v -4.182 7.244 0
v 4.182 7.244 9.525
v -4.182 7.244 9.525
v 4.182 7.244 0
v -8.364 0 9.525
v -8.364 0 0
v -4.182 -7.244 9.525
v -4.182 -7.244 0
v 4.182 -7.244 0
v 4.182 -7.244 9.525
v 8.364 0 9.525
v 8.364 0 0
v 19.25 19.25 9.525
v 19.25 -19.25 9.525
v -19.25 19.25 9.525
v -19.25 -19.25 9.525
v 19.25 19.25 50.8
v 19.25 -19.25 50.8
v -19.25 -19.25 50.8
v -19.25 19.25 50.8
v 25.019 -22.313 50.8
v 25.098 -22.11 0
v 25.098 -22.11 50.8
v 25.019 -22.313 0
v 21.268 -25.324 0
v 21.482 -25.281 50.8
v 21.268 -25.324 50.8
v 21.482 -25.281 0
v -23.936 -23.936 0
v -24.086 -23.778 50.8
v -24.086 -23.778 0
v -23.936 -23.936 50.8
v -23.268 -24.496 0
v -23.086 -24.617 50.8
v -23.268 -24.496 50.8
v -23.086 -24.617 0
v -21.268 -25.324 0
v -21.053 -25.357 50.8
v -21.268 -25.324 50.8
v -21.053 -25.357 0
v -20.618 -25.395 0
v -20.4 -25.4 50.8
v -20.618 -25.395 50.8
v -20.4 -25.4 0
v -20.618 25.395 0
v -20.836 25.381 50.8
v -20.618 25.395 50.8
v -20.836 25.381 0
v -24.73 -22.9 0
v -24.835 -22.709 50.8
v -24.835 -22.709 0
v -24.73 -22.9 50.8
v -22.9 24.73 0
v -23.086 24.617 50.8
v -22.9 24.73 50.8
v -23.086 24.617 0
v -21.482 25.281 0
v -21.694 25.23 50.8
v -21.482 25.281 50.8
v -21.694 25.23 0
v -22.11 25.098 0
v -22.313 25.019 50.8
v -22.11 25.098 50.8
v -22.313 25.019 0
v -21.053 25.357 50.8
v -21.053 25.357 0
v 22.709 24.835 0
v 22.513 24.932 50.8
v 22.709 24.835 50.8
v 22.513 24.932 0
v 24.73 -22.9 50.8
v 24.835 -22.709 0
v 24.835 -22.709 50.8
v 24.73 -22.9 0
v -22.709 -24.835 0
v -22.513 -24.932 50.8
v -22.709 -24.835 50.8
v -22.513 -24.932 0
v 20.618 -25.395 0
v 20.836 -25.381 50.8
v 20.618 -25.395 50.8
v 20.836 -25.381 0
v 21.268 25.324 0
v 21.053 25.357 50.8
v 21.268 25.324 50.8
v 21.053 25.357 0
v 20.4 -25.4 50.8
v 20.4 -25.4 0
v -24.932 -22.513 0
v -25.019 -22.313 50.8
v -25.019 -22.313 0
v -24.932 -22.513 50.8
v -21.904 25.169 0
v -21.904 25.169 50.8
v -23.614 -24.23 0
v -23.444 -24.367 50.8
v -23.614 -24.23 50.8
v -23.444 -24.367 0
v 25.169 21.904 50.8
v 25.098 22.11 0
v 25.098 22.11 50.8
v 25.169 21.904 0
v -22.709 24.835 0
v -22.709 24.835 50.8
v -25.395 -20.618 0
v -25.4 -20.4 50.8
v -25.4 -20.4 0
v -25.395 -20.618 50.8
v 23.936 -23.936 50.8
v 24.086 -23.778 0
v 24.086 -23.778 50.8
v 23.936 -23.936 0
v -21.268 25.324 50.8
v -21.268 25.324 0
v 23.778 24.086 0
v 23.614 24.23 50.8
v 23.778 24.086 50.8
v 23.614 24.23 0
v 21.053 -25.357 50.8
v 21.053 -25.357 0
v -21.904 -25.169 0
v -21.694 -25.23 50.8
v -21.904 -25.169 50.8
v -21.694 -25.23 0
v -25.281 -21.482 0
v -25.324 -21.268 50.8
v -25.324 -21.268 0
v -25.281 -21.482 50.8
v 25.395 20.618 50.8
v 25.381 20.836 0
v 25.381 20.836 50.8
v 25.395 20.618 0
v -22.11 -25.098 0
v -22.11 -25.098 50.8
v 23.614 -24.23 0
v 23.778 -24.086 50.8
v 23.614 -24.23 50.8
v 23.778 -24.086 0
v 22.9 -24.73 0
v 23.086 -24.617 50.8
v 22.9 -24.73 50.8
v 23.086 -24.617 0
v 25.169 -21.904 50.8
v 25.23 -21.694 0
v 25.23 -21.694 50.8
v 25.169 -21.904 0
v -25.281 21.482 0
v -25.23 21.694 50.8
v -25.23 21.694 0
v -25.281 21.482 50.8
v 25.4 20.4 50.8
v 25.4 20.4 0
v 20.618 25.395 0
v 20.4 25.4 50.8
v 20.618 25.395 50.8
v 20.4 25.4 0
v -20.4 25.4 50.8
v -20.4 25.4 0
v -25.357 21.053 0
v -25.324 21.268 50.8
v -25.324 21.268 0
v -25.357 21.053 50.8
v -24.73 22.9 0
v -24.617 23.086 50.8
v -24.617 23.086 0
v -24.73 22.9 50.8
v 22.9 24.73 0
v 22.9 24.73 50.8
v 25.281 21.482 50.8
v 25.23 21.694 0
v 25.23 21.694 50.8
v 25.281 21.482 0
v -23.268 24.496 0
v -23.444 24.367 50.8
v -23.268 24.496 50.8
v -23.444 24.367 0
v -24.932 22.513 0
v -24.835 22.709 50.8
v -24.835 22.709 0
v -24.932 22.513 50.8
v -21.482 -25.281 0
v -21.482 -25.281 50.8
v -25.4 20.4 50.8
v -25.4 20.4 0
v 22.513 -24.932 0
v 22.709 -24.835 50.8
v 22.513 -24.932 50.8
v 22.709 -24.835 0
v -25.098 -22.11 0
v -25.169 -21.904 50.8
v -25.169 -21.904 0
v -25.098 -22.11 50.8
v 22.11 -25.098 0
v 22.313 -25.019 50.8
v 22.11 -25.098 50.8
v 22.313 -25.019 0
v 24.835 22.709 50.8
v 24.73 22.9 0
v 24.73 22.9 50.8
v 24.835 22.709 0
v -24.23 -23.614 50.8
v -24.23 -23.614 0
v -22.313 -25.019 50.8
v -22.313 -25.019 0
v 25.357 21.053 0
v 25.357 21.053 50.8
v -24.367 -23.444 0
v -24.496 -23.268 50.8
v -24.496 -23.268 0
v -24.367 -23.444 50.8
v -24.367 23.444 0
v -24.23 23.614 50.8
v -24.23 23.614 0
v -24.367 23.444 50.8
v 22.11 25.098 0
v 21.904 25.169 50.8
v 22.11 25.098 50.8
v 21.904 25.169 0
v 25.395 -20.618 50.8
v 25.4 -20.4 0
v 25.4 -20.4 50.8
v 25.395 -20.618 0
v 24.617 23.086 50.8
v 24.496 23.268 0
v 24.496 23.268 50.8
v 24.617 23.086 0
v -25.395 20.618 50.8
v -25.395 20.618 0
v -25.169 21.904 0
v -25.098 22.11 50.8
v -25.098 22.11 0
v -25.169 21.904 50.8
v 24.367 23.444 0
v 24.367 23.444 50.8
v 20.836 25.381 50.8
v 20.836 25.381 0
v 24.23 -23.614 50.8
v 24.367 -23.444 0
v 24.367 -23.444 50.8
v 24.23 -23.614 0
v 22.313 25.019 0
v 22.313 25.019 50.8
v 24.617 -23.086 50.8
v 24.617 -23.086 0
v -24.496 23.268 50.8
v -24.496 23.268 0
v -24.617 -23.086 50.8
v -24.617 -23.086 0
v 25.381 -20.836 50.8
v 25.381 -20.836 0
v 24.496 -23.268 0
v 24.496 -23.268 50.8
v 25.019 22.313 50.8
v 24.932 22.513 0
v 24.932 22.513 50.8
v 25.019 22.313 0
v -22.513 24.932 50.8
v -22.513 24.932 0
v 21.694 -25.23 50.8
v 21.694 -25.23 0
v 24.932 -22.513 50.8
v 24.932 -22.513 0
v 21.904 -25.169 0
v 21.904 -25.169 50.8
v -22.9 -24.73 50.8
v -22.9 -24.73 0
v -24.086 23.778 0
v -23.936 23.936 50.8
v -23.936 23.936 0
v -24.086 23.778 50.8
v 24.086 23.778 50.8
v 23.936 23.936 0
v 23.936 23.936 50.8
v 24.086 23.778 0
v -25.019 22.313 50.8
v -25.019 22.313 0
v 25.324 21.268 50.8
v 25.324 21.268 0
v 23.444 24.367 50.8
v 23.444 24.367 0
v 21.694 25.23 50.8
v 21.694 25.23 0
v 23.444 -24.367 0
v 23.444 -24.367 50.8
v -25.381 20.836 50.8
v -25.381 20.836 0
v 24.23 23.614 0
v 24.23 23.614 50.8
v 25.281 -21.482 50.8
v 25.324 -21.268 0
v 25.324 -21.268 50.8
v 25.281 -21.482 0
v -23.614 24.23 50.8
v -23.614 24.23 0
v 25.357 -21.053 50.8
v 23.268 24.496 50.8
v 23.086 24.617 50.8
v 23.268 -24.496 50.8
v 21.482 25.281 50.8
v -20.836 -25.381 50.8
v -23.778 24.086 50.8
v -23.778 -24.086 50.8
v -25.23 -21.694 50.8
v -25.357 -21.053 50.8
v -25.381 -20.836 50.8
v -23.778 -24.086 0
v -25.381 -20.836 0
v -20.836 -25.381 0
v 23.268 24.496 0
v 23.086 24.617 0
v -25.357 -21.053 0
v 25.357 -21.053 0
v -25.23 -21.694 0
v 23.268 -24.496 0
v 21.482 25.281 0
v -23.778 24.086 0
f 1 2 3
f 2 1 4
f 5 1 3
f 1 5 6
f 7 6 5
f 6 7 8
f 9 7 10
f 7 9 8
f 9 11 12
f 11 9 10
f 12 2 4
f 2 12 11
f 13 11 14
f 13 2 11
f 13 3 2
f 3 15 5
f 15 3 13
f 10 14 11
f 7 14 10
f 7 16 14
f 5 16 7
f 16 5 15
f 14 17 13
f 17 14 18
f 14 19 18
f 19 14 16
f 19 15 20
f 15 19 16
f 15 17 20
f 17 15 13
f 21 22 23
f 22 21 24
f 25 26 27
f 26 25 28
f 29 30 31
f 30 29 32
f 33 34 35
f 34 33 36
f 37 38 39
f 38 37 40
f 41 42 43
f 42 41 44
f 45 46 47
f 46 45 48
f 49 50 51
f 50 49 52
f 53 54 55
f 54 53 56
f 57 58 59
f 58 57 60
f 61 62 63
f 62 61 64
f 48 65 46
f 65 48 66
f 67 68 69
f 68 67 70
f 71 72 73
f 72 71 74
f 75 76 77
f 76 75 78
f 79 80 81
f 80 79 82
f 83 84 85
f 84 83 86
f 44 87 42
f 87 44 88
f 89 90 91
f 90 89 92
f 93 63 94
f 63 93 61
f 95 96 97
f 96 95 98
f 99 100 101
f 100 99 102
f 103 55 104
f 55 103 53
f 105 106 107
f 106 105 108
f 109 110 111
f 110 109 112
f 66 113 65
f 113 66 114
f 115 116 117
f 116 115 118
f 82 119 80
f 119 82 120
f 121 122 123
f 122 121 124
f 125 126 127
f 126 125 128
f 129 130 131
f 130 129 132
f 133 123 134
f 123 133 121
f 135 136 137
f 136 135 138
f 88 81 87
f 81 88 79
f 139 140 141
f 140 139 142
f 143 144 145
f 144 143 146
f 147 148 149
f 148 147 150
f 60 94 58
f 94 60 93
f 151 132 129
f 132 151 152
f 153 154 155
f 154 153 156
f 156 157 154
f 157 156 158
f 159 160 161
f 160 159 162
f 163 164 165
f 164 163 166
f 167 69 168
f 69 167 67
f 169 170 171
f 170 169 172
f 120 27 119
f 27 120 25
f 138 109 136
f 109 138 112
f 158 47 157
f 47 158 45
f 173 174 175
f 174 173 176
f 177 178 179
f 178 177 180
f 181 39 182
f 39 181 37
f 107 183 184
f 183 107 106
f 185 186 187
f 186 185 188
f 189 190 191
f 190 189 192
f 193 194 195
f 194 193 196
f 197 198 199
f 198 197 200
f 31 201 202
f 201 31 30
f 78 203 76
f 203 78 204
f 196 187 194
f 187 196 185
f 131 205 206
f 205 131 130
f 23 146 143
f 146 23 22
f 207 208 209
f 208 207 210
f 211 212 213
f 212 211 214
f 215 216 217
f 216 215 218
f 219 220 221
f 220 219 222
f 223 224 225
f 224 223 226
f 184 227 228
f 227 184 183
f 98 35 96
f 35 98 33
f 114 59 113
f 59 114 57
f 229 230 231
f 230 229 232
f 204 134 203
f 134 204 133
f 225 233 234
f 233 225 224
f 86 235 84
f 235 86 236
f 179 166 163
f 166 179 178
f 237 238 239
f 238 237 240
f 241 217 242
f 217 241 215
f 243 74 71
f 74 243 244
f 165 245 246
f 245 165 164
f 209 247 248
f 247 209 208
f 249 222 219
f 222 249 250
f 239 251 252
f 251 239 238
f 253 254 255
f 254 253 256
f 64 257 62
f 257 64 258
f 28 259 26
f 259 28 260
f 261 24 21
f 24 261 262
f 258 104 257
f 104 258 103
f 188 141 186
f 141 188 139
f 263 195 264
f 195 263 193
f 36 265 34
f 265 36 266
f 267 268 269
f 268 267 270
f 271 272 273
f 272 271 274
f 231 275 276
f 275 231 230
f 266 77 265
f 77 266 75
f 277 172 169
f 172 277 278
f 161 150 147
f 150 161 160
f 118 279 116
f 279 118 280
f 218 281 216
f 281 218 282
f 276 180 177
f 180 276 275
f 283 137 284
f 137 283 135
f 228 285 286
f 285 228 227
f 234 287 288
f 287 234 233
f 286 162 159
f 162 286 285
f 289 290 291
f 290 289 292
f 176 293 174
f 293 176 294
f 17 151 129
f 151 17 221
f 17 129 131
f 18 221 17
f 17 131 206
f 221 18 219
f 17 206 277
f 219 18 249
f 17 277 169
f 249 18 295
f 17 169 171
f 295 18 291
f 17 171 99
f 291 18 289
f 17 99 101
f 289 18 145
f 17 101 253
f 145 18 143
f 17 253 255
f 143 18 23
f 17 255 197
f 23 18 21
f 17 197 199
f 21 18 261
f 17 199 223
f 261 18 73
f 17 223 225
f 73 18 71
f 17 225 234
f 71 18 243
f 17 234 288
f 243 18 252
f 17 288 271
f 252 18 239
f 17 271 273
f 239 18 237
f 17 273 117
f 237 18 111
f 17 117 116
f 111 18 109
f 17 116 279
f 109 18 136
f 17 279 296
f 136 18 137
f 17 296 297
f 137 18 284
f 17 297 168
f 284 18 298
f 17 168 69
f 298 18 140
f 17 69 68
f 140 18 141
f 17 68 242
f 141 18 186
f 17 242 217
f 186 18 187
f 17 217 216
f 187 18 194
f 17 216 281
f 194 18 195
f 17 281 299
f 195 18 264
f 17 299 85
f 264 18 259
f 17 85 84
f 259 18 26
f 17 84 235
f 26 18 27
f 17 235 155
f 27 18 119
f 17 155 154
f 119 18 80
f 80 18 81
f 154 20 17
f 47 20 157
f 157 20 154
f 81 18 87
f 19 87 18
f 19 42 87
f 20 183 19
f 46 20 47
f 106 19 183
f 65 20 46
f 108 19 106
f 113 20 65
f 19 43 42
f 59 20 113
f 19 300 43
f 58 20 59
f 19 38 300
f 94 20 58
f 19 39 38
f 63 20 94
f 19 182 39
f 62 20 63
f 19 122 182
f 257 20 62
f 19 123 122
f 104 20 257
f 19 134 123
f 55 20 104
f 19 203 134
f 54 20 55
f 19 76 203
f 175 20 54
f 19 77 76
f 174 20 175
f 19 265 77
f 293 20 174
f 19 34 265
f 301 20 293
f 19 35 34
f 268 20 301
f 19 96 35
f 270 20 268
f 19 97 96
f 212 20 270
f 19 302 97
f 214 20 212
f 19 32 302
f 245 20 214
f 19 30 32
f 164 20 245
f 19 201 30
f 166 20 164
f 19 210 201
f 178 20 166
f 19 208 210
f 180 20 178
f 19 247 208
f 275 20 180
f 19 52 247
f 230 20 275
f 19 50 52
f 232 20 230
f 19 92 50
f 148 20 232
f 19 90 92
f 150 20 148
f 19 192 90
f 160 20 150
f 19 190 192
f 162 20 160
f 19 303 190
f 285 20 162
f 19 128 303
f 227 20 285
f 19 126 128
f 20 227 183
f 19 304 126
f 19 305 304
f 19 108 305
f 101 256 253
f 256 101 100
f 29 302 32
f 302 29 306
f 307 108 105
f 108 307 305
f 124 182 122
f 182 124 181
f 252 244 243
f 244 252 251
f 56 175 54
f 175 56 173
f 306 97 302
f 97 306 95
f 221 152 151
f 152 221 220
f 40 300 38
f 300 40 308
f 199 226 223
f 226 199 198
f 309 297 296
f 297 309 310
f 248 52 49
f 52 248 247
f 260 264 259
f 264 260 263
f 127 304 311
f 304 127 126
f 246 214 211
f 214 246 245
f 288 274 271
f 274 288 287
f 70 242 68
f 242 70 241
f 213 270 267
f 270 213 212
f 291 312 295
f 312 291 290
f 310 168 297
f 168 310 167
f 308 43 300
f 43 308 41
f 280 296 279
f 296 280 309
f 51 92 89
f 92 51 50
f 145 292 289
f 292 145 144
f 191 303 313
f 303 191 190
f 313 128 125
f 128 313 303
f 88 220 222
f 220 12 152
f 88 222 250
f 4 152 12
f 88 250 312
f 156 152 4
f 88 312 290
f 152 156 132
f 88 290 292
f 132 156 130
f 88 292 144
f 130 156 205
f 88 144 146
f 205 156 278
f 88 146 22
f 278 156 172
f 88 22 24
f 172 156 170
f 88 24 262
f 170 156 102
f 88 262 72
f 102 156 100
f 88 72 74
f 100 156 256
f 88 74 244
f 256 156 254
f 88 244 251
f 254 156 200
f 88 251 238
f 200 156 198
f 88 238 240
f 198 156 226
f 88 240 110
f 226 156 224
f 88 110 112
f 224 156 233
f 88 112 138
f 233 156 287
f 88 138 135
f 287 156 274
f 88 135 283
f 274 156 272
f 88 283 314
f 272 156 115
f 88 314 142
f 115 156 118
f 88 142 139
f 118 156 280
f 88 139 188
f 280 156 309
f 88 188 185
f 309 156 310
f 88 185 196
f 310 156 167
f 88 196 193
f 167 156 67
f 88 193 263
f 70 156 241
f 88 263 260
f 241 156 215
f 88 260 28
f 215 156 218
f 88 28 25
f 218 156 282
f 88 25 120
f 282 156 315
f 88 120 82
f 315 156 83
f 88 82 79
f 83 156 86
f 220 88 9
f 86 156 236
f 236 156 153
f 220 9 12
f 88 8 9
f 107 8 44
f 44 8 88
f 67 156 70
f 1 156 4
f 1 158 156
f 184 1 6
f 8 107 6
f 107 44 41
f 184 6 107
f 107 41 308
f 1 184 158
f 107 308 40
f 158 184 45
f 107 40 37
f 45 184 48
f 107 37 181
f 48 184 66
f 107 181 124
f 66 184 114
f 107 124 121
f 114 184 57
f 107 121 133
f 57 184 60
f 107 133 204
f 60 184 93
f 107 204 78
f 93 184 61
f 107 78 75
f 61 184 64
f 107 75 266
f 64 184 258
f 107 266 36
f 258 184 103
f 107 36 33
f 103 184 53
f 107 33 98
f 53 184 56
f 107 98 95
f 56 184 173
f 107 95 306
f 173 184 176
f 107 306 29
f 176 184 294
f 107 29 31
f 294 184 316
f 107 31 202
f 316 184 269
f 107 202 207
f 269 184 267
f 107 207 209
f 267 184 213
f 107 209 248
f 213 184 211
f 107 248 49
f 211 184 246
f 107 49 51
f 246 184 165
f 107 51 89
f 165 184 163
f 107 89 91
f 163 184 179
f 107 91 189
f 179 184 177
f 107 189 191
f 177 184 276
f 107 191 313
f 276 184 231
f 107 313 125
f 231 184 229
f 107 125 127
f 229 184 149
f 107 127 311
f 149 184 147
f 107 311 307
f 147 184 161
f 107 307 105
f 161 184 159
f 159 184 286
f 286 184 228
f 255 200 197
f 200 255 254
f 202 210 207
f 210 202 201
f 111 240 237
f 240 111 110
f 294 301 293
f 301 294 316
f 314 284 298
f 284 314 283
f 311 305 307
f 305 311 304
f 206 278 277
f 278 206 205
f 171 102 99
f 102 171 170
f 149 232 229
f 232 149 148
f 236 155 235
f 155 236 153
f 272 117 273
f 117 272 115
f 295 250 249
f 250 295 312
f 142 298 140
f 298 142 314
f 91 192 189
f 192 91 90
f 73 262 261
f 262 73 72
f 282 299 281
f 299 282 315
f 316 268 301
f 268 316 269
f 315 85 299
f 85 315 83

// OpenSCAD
// file: ../lib/TOGUnitTable-v1.scad
// TOGUnitTable-v1.1.0 - Library for handling 'complex amounts' in the form of [multiplier, unit name], e.g. [1.5, "inch"]
//
// 2023-07-01: the following 'annotation' is something I just made up,
// but is intended as a way for future packaging tools to know that it's 'safe'
// (because everything has been somewhat namespaced) to turn a `use <x>`
// into an `include <x>`, making it inlinable:
// safe-to-include: true
// 
// Versions:
// v1.0.0:
// - Created it.
// v1.1.0:
// - Add optional 'dbgctxstr' parameter to unit decoding functions, for better error messages
// 
// Naming convention:
// Doing 'OO without classes', here.
// Fully qualified name = class or package name + "__" + member name
// Class or package name may itself be namespaced, and class names may double as package names.
// Here, tog_unittable names both a class and a package.

// Demo unit table uses 'micrometer' as the base unit
// in order to keep multipliers as integers as much as possible.
tog_unittable__demo_unit_table = [
	["um",    [    1   ,   "um"], "micrometer" ],
	["mm",    [ 1000   ,   "um"], "millimeter" ],
	["inch",  [25400   ,   "um"], "inch"       ],
	["u",     [    1/16, "inch"], "model unit" ], // As used by TGx9 et al
	["atom",  [    8   ,    "u"], "model atom" ],
	["chunk", [    3   , "atom"], "model chunk"],
];

use <./DbgCtxStrLib1.scad>

function tog_unittable__list__filter(list, predicate) = [
	for( item=list ) if( predicate(item) ) item
];
function tog_unittable__list__first(list, on_error) =
	len(list) > 0 ? list[0] : on_error();

function tog_unittable__unit_value_ca(unit_table, unit_name, dbgctxstr=undef) =
	tog_unittable__list__first(
		tog_unittable__list__filter(unit_table, function (entry) entry[0] == unit_name),
		function () assert(false,
			str("Did not find entry for unit '", unit_name, "' in unit table", dbgctxstr_errmsg_suffix(dbgctxstr))
		)
	)[1];

function tog_unittable__ca__is_valid( ca ) =
	is_list(ca) && len(ca) == 2;

// Break down 'amount' until it is in a base unit (one which is defined in terms of itself)
function tog_unittable__simplify_ca(unit_table, amount, dbgctxstr=undef) =
	assert( tog_unittable__ca__is_valid(amount), str(amount, " is not a valid Complex Amount (should be [numeric_value, \"unit_name\"])", dbgctxstr=dbgctxstr) )
	let( unit_value_ca = tog_unittable__unit_value_ca(unit_table, amount[1], dbgctxstr=dbgctxstr) )
	unit_value_ca[1] == amount[1] ? amount :
		tog_unittable__simplify_ca(unit_table, [amount[0] * unit_value_ca[0], unit_value_ca[1]]);

function tog_unittable__divide_ca(unit_table, numerator, denominator, dbgctxstr=undef) =
	let(
		numerator_base_ca   = tog_unittable__simplify_ca(unit_table, numerator, dbgctxstr=dbgctxstr),
		denominator_base_ca = tog_unittable__simplify_ca(unit_table, denominator, dbgctxstr=dbgctxstr)
	)
	assert(numerator_base_ca[1] == denominator_base_ca[1], str("Different base units found for ", numerator[1], " and ", denominator[1]))
	numerator_base_ca[0] / denominator_base_ca[0];	

assert(tog_unittable__divide_ca(tog_unittable__demo_unit_table, [1,   "mm"], [  1, "mm"]) ==     1   );
assert(tog_unittable__divide_ca(tog_unittable__demo_unit_table, [1,   "mm"], [  1, "um"]) ==  1000   );
assert(tog_unittable__divide_ca(tog_unittable__demo_unit_table, [1, "inch"], [  1, "um"]) == 25400   );
assert(tog_unittable__divide_ca(tog_unittable__demo_unit_table, [1, "inch"], [  1, "mm"]) ==    25.4 );
assert(tog_unittable__divide_ca(tog_unittable__demo_unit_table, [1, "inch"], [254, "um"]) ==   100   );
assert(tog_unittable__divide_ca(tog_unittable__demo_unit_table, [1,    "u"], [  1, "um"]) ==  1587.5 );
// file: ../lib/TOGStringLib1.scad
// TOGStringLib1.7
// 
// Functions for parsing quantities
// and other misc. string handling.
// 
// v1.5
// - togstr1_parse_quantity will treat unit-only strings as meaning 1/1 of that unit.
//   e.g. togstr1_parse_quantity("foot") = [[[1,1], "foot", 4]]
// v1.6:
// - togstr1_parse_quantity allows unit name to be omitted when quantity is zero and $togunits1_default_unit is defined
// v1.7:
// - Add optional 'dbgctxstr' parameter to unit decoding functions, for better error messages
// 
// Globals: $togunits1_default_unit - affects what 'unit' is returned
// when interpreting numbers or strings that lack the unit.


function togstr1__todo(message) = assert(false, str("TODO: ", message));

module togstr1__assert_eq(a, b) {
	if( a != b ) {
		assert( a == b, str(a, " != ", b) );
	}
}



function togstr1_slice(source, i0, i1) =
	i0 == i1 ? "" :
	str(source[i0], togstr1_slice(source, i0+1, i1));

function togstr1_tokenize(source, sep, maxcount=9999, i=0, tokenstart=0) =
	len(source) == i ? (
		(tokenstart < i) ? [togstr1_slice(source, tokenstart, i)] : []
	) :
	source[i] == sep ? (
		(tokenstart < i) ? concat([togstr1_slice(source, tokenstart, i)], togstr1_tokenize(source, sep, maxcount-1, i+1, i+1)) :
		togstr1_tokenize(source, sep, maxcount, i+1, i+1)
	) :
	maxcount <= 1 ? [togstr1_slice(source, tokenstart, len(source))] :
	togstr1_tokenize(source, sep, maxcount, i+1, tokenstart);

togstr1__assert_eq( ["foo","bar","baz"], togstr1_tokenize("foo-bar-baz", "-") );
// Duplicate delimiters are ignored
togstr1__assert_eq( ["foo","bar","baz"], togstr1_tokenize("foo--bar--baz", "-") );
// Trailing delimiters are ignored
togstr1__assert_eq( ["foo","bar","baz"], togstr1_tokenize("foo--bar--baz--", "-") );
// Leading delimiters are ignored
togstr1__assert_eq( ["foo","bar","baz"], togstr1_tokenize("--foo--bar--baz", "-") );
// Can limit number of tokens returned
togstr1__assert_eq( ["foo","bar-baz"], togstr1_tokenize("foo-bar-baz", "-", 2) );
togstr1__assert_eq( ["foo","bar-baz"], togstr1_tokenize("--foo--bar-baz", "-", 2) );
togstr1__assert_eq( ["foo","bar--baz"], togstr1_tokenize("--foo--bar--baz", "-", 2) );
togstr1__assert_eq( ["foo"], togstr1_tokenize("--foo--", "-", 2) );




/** \d+ -> [num, end_index] */
function togstr1_parse_decimal_nat(str, index=0, current=0, dbgctxstr=undef) =
	len(str) == index ? [current, index] :
	let( dig = ord(str[index]) - ord("0") )
	(dig >= 0 && dig <= 9) ? togstr1_parse_decimal_nat(str, index+1, current*10 + dig, dbgctxstr=dbgctxstr) :
	[current, index];

togstr1__assert_eq( [123,3], togstr1_parse_decimal_nat("123") );
togstr1__assert_eq( [123,3], togstr1_parse_decimal_nat("123.45") );

/** [+-]*\d+ ->  [[num, den], end_index] */
function togstr1_parse_decimal_number(str, index=0, dbgctxstr=undef) =
	str[index] == "+" ? togstr1_parse_decimal_number(str, index+1) :
	str[index] == "-" ? let(r=togstr1_parse_decimal_number(str, index+1)) [[-r[0][0], r[0][1]], r[1]] :
	let(r = togstr1_parse_decimal_nat(str, index, dbgctxstr=dbgctxstr))
	str[r[1]] != "." ? [[r[0], 1], r[1]] :
	let(fracr = togstr1_parse_decimal_nat(str, r[1]+1))
	let(mult = pow(10, fracr[1]-(r[1]+1)))
	[[r[0]*mult + fracr[0], mult], fracr[1]];

togstr1__assert_eq( [[   36,   1], 2], togstr1_parse_decimal_number( "36"   ) );
togstr1__assert_eq( [[ 3524, 100], 5], togstr1_parse_decimal_number( "35.24") );
togstr1__assert_eq( [[-3524, 100], 6], togstr1_parse_decimal_number("-35.24") );
togstr1__assert_eq( [[    0,   1], 0], togstr1_parse_decimal_number( "NotANumber") );

function togstr1__gcd(a, b) = b == 0 ? abs(a) : togstr1__gcd(b, a % b);

togstr1__assert_eq(10, togstr1__gcd(10, 20));
togstr1__assert_eq( 5, togstr1__gcd(10, 15));
togstr1__assert_eq( 2, togstr1__gcd(10, 14));


function togstr1__normalize_rat(rat) =
	let(gcd = togstr1__gcd(rat[0], rat[1]))
	// TODO: find LCD, divide top and bottom by it
	rat[0] < 0 && rat[1] < 0 ? [-rat[0]/gcd, -rat[1]/gcd] :
	[rat[0]/gcd, rat[1]/gcd];

/** <decnum>[/<decnum>] -> [[num, den], end_index] */
function togstr1__multiply_rat(a, b) =
	togstr1__normalize_rat(
		a[1] == b[1] ? [a[0]*b[0]/a[1], a[1]] : // TODO: LCD instead of special case
		[a[0]*b[0], a[1]*b[1]]
	);
function togstr1__divide_rat(a, b) = togstr1__normalize_rat([a[0]*b[1], a[1]*b[0]]);


function togstr1__add_rat(a, b) =
	togstr1__normalize_rat([a[0]*b[1] + b[0]*a[1], a[1]*b[1]]);
	
togstr1__assert_eq([1, 2], togstr1__add_rat([1, 3], [1, 6]));


/** Return [[num, den], end_index] */
function togstr1_parse_rational_number(str, index=0, dbgctxstr=undef) =
	let( numr = togstr1_parse_decimal_number(str, index, dbgctxstr=dbgctxstr) )
	str[numr[1]] == "+" ?
		let(numrb = togstr1_parse_rational_number(str, numr[1]+1, dbgctxstr=dbgctxstr))
		[togstr1__add_rat(numr[0], numrb[0]), numrb[1]]	:
	str[numr[1]] == "/" ?
		let( denr = togstr1_parse_decimal_number(str, numr[1]+1, dbgctxstr=dbgctxstr) )
		[togstr1__divide_rat(numr[0], denr[0]), denr[1]] :
	numr;

togstr1__assert_eq( [[   123,  1],3], togstr1_parse_rational_number( "123") );
togstr1__assert_eq( [[   123,  1],4], togstr1_parse_rational_number("+123") );
togstr1__assert_eq( [[-  123,  1],4], togstr1_parse_rational_number("-123") );
togstr1__assert_eq( [[   123,  1],6], togstr1_parse_rational_number("-+-123") );
togstr1__assert_eq( [[ 12345,100],6], togstr1_parse_rational_number("123.45") );
togstr1__assert_eq( [[  2469, 40],8], togstr1_parse_rational_number("123.45/2") );
togstr1__assert_eq( [[-  823,160],10], togstr1_parse_rational_number("-123.45/24") );
togstr1__assert_eq( [[     4,  3],5], togstr1_parse_rational_number( "1+1/3") );
togstr1__assert_eq( [[     0,  1],0], togstr1_parse_rational_number( "NotANumber!!") );


/** Return [[[num, den], unit], end_index] */
function togstr1_parse_quantity(str, dbgctxstr=undef) =
	let( numr = togstr1_parse_rational_number(str, dbgctxstr=dbgctxstr) )
	// For now, just let the unit be the rest of the string;
	// can revisit to stop at delimiters if needed in the future.
	numr[1] > 0 && numr[1] == len(str) && numr[0][0] == 0 && !is_undef($togunits1_default_unit) ? [[[0,1], $togunits1_default_unit], numr[1]] :
	assert( numr[1] < len(str), str("Quantity string missing unit: '", str, "'; note that '0' is acceptable if $togunits1_default_unit is defined"))
	let( unit = togstr1_slice(str, numr[1], len(str)) )
	let( quant = numr[1] > 0 ? numr[0] : [1,1] ) // No number = 1 (possibly this should be an error instead)
	[[quant, unit], len(str)];

togstr1__assert_eq( [[[  3,  1], "acre"],  5], togstr1_parse_quantity("3acre") );
togstr1__assert_eq( [[[  3,  5], "acre"],  7], togstr1_parse_quantity("3/5acre") );
togstr1__assert_eq( [[[301,500], "acre"], 10], togstr1_parse_quantity("3.01/5acre") );
togstr1__assert_eq( [[[  1,  1], "acre"],  4], togstr1_parse_quantity("acre") ); // Should either treat as one or throw an error!
togstr1__assert_eq( [[[  0,  1],"hectare"],1], togstr1_parse_quantity("0", $togunits1_default_unit="hectare") ); // Zero is fine if $togunits1_default_unit is defined
// file: ../lib/TOGridLib3.scad
// TOGridPileLib-v3.4
// 
// HOKAY WHAT ARE THE COMMON
// things that I want the library to do?
// 
// - [X] Be `include`-able, to make inlining easy
// - [X] Allow unit table to be overridden easily, but default by default
// - [ ] Support common configurations by name (e.g. "V9", or some "WSTYPE-...")
//   without having to pass 50 different parameters in
// - [ ] Support subtractions for those common configurations also,
//   such that you don't need to remember to 'do less rounding', etc.
// - [ ] Make a simple foot-only block that I can subtract stuff from
//   params: foot style
// - [ ] Make a block with a lip
// - [ ] Make a block foot, and I'll intersect it with some other things
// - [X] Translate a block_size_ca to mm
// 
// Changes:
// v3.1:
// - s/togridpile3_decode_size/togridpile3_decode_vector/
// v3.2:
// - togridpile3_decode(num) = num
// v3.3:
// - Change prefix from `togridpile3` to `togridlib3`
// v3.4:
// - Add optional 'dbgctxstr' parameter to unit decoding functions, for better error messages

use <../lib/TOGUnitTable-v1.scad>

function togridlib3_map(arr, fn) = [ for(item=arr) fn(item) ];

togridlib3_default_unit_table = [
	["um",    [    1,               "um"]],
	["mm",    [ 1000,               "um"]],
	["inch",  [25400,               "um"]],
	["u",     [    1.5875,          "mm"]],
	["atom",  [    8,                "u"]],
	["chunk", [    3,             "atom"]],
	["tgp-standard-bevel"   , [2,    "u"]], // Usuually 1/8"
	["m-outer-corner-radius", [4,    "u"]],
	["f-outer-corner-radius", [3,    "u"]],
];

function togridlib3_get_default_unit_table() = togridlib3_default_unit_table;
function togridlib3_get_unit_table() = is_undef($togridlib3_unit_table) ? togridlib3_default_unit_table : $togridlib3_unit_table;

function togridlib3_decode(dim, unit=[1, "mm"], unit_table=togridlib3_get_unit_table(), dbgctxstr=undef) =
	is_num(dim) ? dim : tog_unittable__divide_ca(unit_table, dim, unit, dbgctxstr=dbgctxstr);
function togridlib3_decode_vector(size, unit=[1, "mm"], unit_table=togridlib3_get_unit_table(), dbgctxstr=undef) =
	togridlib3_map(size, function(dim) is_num(dim) ? dim : tog_unittable__divide_ca(unit_table, dim, unit, dbgctxstr=dbgctxstr));

module togridlib3_cube(size, offset=0) {
	cube(togridlib3_decode_vector(size), center=true);
}
// file: ../lib/DbgCtxStrLib1.scad
// DbgCtxStrLib1.0
// 
// Library for dealing with 'debug context strings' (usually 'dbgctxstr').

function dbgctxstr_errmsg_suffix(dbgctxstr) =
	is_undef(dbgctxstr) || dbgctxstr == "" ? "" :
	str(" (", dbgctxstr, ")");
// file: ../lib/TOGArrayLib1.scad
// TOGArrayLib1.5
// 
// Functions for working with arrays.
// 
// v1.1:
// - tal1_reduce assert(is_list(items)) to prevent infinite recursion
//   when given undefined or other non-list values
// v1.1.1:
// - Fix tal1_uniq_remap_v2 to return "list-remap-result" as the
//   first element of the returned list
// v1.2:
// - Add tal1_replace_at function
// v1.3:
// - tal1_is_vec_of, tal1_is_vec_of_num
// v1.4:
// - tal1_assert_for_each, for when you want to assert something
//   about each of a list of items and get nice failure messages
// v1.5:
// - Add tal1_duplicate_reversed function, which may be
//   handy when generating symmetrical polygons and stuff.

/**
 * Make a list with the contents of list `a`,
 * but starting at offset `off`, replaced by the contents of list `b`.
 * len(result) = max(len(a), off+len(b))
 */
function tal1_replace_at(a, off, b, default_value=undef, default_value_function=undef) =
	assert(is_list(a))
	assert(is_list(b))
	let( _dvf = !is_undef(default_value_function) ? default_value_function : function(i) default_value )
[
	for( i=[0:1:min(off,len(a))-1] ) a[i],
	for( i=[len(a):1:off-1] ) _dvf(i),
	for( i=[off:1:off+len(b)-1] ) b[i-off],
	for( i=[off+len(b):1:len(a)-1] ) a[i],
];

// Simplest case
assert([] == tal1_replace_at([], 0, []));
// Second simplest cases
assert(["foo"] == tal1_replace_at(["foo"], 0, []));
assert(["foo"] == tal1_replace_at([], 0, ["foo"]));
// Replace one item
assert(["foo","quux","baz"] == tal1_replace_at(["foo","bar","baz"], 1, ["quux"]));
// Replace and extend
assert(["foo","quux","tuna","tina"] == tal1_replace_at(["foo","bar","baz"], 1, ["quux", "tuna", "tina"]));
// Add beyond end of `a`
assert(["foo","zzz","quux"] == tal1_replace_at(["foo"], 2, ["quux"], default_value="zzz"));
// Adding 'nothing' should still fill to that point with defaults
assert(["foo","zzz","zzz"] == tal1_replace_at(["foo"], 3, [], default_value="zzz"));


function tal1_reduce(start, items, func, offset=0) =
	assert(is_list(items))
	len(items) == offset ? start :
	tal1_reduce(func(start, items[offset]), items, func, offset+1);

function tal1_consecutive_duplicate_count(items) = tal1_reduce(
	[0, undef],
	items,
	function(z,item) [z[0] + (item == z[1] ? 1 : 0), item]
)[0];

assert(0 == tal1_consecutive_duplicate_count([]));
assert(0 == tal1_consecutive_duplicate_count([50]));
assert(1 == tal1_consecutive_duplicate_count([50,50]));
assert(0 == tal1_consecutive_duplicate_count([50,51,52,53]));
assert(1 == tal1_consecutive_duplicate_count([50,51,52,52]));
assert(3 == tal1_consecutive_duplicate_count([50,50,50,50]));

// Set test_size to arbirarily large values
// to ensure that OpenSCAD can handle heavy recursion
let(test_size=1000) assert(test_size/2 == tal1_consecutive_duplicate_count([for(i=[0:1:test_size-1]) floor(i/2)]));



function tal1_uniq_(items, off0, off1) =
	let(chunklen = off1-off0)
	chunklen == 0 ? [] :
	chunklen == 1 ? [items[off0]] :
	let(half=floor(chunklen/2))
	let(left  = tal1_uniq_(items, off0     , off0+half))
	let(right = tal1_uniq_(items, off0+half, off1     ))
	assert(len(left) > 0)
	assert(len(right) > 0)
	left[len(left)-1] == right[0] ? [each left, for(i=[1:1:len(right)-1]) right[i]] :
	[each left, each right];

/** Given a list of items, returns a new list with identical consecutive items merged */
function tal1_uniq(items) = tal1_uniq_(items, 0, len(items));

assert([] == tal1_uniq([]));
assert([123] == tal1_uniq([123]));
assert([55,0,1,2,3] == tal1_uniq([55,0,1,2,3]));
assert([55,0,1,2] == tal1_uniq([55,0,1,1,2]));
assert([55,0,1] == tal1_uniq([55,55,0,0,0,0,0,0,1,1,1,1]));
assert([55,0] == tal1_uniq([55,0,0,0,0,0,0,0]));



/**
 * Returns [new items, old index -> new index mapping].
 * No-op version.
 */
function tal1_uniq_remap_v1(items) =
	["list-remap-result", items, [for (vi=[0:1:len(items)-1]) vi]];

// [a, a, b, b, c, c]
//
// [a,    ...], []  -> [a],[0]
// [a, a, ...], [0] -> [a],[0,0]

assert([1,2,3] == [1,2,3]);

/**
 * Recursive version that will combine adjacent identical vertexes,
 * but will use the original items.
 */
function tal1_uniq_remap_v2(items, map=[]) =
	let(index = len(map))
	len(items) == index ? ["list-remap-result", items, map] :
	index == 0 ? tal1_uniq_remap_v2(items, [0]) :
	items[index] == items[map[index-1]] ? tal1_uniq_remap_v2(items, [for(vi=map) vi, map[index-1]]) :
	tal1_uniq_remap_v2(items, [for(vi=map) vi, index]);

assert(tal1_uniq_remap_v2([1,1,2,2,3,4]) == ["list-remap-result", [1,1,2,2,3,4], [0,0,2,2,4,5]]);


/**
 * Returns true if `vec` is a list of at least min_len items
 * and component_check(each item, even those beyond min_len) is true.
 */
function tal1_is_vec_of(vec, min_len=0, component_check=function(x) true) =
	assert(is_num(min_len) && min_len >= 0)
	assert(is_function(component_check))
	is_list(vec) && len(vec) >= min_len &&
	tal1_reduce(true, vec, function(prev,item) prev && component_check(item));

function tal1_is_vec_of_num(vec, min_len=0) = tal1_is_vec_of(vec, min_len, function(i) is_num(i));

assert( true == tal1_is_vec_of_num([1,2,3]));
assert( true == tal1_is_vec_of_num([]));
assert( true == tal1_is_vec_of_num([1,2,3], 3));
assert(false == tal1_is_vec_of_num([1,2], 3));
assert(false == tal1_is_vec_of_num([1,2,"spoon"], 3));
// Requirements are ambiguous when
// first min_len items are numbers, but there are non-numeric items afterwards,
// so let's error on the side of saying 'no, it's not a list of numbers';
// i.e. the item check and the min_len are independent.
assert(false == tal1_is_vec_of_num([1,2,3,"artichoke"], 3));


/**
 * Asserts that item_checker(each item in list, index of item)[0] is true.
 * Second element of item_checker return value is assertion message.
 * Returns the original list, in case that's useful to you.
 */
function tal1_assert_for_each(list, item_checker) =
	let( _ignored = [ for(i=[0:1:len(list)-1])
		let(q=item_checker(list[i],i))
		let(passed=is_bool(q) ? q : is_list(q) ? q[0] : assert(false, str(
			"tal1_assert_for_each: item_checker should return Bool|[Bool,String], but returned ",
			q, " for item at index ", i)))
		let(message=is_list(q) ? q[1] : undef)
		assert(passed, message)
		q
	])
	list;

// Callback can return a boolean...
assert([1,2,3] == tal1_assert_for_each([1,2,3], function(v,i) is_num(v)));
// ...or a [boolean, string]
assert([1,2,3] == tal1_assert_for_each([1,2,3], function(v,i) [is_num(v), "element be a num"]));

// [a, b, c] -> [a, b, c, rxf(c), rxf(b), rxf(a)]
function tal1_duplicate_reversed(list, rxf=function(item) item) =
	[
		each list,
		for( i=[len(list)-1 : -1 : 0] ) rxf(list[i]),
	];
// file: ../lib/TOGUnits1.scad
// TOGUnits1.7
// 
// For simlifying quantity parsing and unit conversion
// 
// v1.1:
// - Add `togunits1_decode` function
// v1.2:
// - Add togunits1_decode_vec
// v1.3:
// - Add togunits1_vec_to_cas
// v1.4:
// - Add togunits1_vec_to_mms
// v1.5:
// - Remove unused `unit` parameter from `togunits1_vec_to_cas`
// v1.6:
// - togunits1_decode accepts `xf` parameter, same as togunits1_decode_vec
// v1.7:
// - Add optional 'dbgctxstr' parameter to unit decoding functions, for better error messages
// 
// Reserved but not-yet-actually-used globals:
// - $togunits1_default_unit - default unit when interpreting "0"
//   - See TOGStringLib1
// - $togunits1_default_implied_unit - when interpreting quantities without unit, assume they have this one
//   - This might be a bad idea, so never implemented!

use <./DbgCtxStrLib1.scad>
use <./TOGridLib3.scad>
use <./TOGStringLib1.scad>

function togunits1__is_ca(what) =
	is_list(what) && len(what) == 2 && is_num(what[0]) && is_string(what[1]);

function togunits1__parse_to_ca(what, dbgctxstr=undef) =
	assert( is_string(what) )
	let( parseresult = togstr1_parse_quantity(what, dbgctxstr) )
	assert( parseresult[1] > 0, str("Failed to parse quantity from  ", what, dbgctxstr=dbgctxstr) )
	let( parsed = parseresult[0] )
	let( rat = parsed[0] )
	let( unit = parsed[1] )
	[rat[0]/rat[1], unit];

function togunits1_to_ca(what, dbgctxstr=undef) =
	is_string(what) ? togunits1__parse_to_ca(what, dbgctxstr=dbgctxstr) :
	togunits1__is_ca(what) ? what :
	is_num(what) ? [what, "mm"] :
	assert(false, str("Unrecognized quantity representation: ", what));

function togunits1_vec_to_cas(whats) =
	[for(w=whats) togunits1_to_ca(w)];

function togunits1__get_transform(name) =
	is_function(name) ? name :
	is_undef(name) ? function(n) n :
	name == "round" ? function(n) round(n) :
	name == "ceil" ? function(n) ceil(n) :
	assert(false, str("Unrecognized transform: '", name, "'"));

function togunits1_decode(what, unit=[1,"mm"], xf=undef, dbgctxstr=undef) =
	let( ca = togunits1_to_ca(what, dbgctxstr=dbgctxstr) )
	let( xf1 = togunits1__get_transform(xf) )
	xf1(togridlib3_decode(ca, unit=togunits1_to_ca(unit), dbgctxstr=dbgctxstr));

function togunits1_decode_vec(whats, unit=[1,"mm"], xf=undef) =
	let( unit_ca = togunits1_to_ca(unit) )
	let( xf1 = togunits1__get_transform(xf) )
	[for(w=whats) xf1(togunits1_decode(w, unit_ca))];

function togunits1_to_mm(what, dbgctxstr=undef) = togunits1_decode(what, [1,"mm"], dbgctxstr=dbgctxstr);
function togunits1_vec_to_mms(what) = togunits1_decode_vec(what, [1,"mm"]);
// file: ../lib/TOGMod1Constructors.scad
// TOGMod1Constructors-v1.11
// 
// Functions to construct objects understood by TOGMod1
// 
// v1.1:
// - Add togmod1_make_rounded_rect
// v1.2:
// - togmod1_make_rounded_rect can make ovals
// v1.3:
// - togmod1_circle_points, to just get the points of a circle
// - if pos parameter to circle function has a third element,
//   returned vertexes will include it as the z component;
// v1.3.1
// - Some assertions
// v1.4:
// - Refactor togmod1_rounded_rect_points and togmod1_circle_points
//   to use togmod1__make_nd_vector_adder for adapting to whatever
//   `pos` parameter is.
// v1.5:
// - togmod_rounded_rect_points will not simplify completely rounded sides
//   (where length of side is exactly twice the rounding radius)
//   unless simplify_rounded_sides=true
//   - This makes it more useful for polyhedron generation,
//     where radius varies, but number of points must remain constant.
// v1.6:
// - togmod1_make_rect makes a simple rectangle
// - togmod1_make_rounded_rect will defer to togmod1_make_rect when r=0
// v1.7:
// - togmod1_make_circle will return empty shape (["union"]) when d=0
// v1.8:
// - Add togmod1_text
// v1.9:
// - togmod1_circle_points uses 3 as minimum circle point count instead of 6
// v1.10:
// - Fix togmod1_linear_extrude_y so that range corresponds to Y start/end and
//   polygon X,Y correspond to X,Z.  Previously it was rotated wrongly,
//   which would have gone unnoticed for symmetrical shapes centered at 0,0.
// v1.11:
// - Remove an 'echo'

use <./TOGArrayLib1.scad>

function togmod1__make_nd_vector_adder(origin=[0,0]) =
	let(origin_is_zero = tal1_reduce(true, origin, function(prev,item) prev && item == 0))
	origin_is_zero ? (function(vec) len(vec) >= len(origin) ? vec : tal1_replace_at(origin, 0, vec)) :
	function(vec) [
		for(i=[0:1:max(len(origin),len(vec))-1]) (len(vec) > i ? vec[i] : 0) + (len(origin) > i ? origin[i] : 0),
	];

assert([1,2,3] == togmod1__make_nd_vector_adder()([1,2,3]));
assert([1,2,3] == togmod1__make_nd_vector_adder([0,0,3])([1,2]));


function togmod1_make_cuboid(size) =
	assert(is_list(size))
	assert(len(size) >= 3)
	assert(is_num(size[0]))
	assert(is_num(size[1]))
	assert(is_num(size[2]))
	["polyhedron-vf", [
		[-size[0]/2, -size[1]/2, -size[2]/2],
		[+size[0]/2, -size[1]/2, -size[2]/2],
		[-size[0]/2, +size[1]/2, -size[2]/2],
		[+size[0]/2, +size[1]/2, -size[2]/2],
		[-size[0]/2, -size[1]/2, +size[2]/2],
		[+size[0]/2, -size[1]/2, +size[2]/2],
		[-size[0]/2, +size[1]/2, +size[2]/2],
		[+size[0]/2, +size[1]/2, +size[2]/2]
	], [
		[0,1,3,2],[0,4,5,1],[4,6,7,5],[3,7,6,2],[1,5,7,3],[6,4,0,2]
	]];

function togmod1_make_polygon(verts) =
	["polygon-vp", verts, [[for( i=[0:1:len(verts)-1] ) i%len(verts)]]];

function togmod1_rounded_rect_points(size, r, pos=[0,0], simplify_rounded_sides=false) =
	assert(is_list(size))
	assert(len(size) >= 2)
	let(radii = is_list(r) ? r : is_num(r) ? [r,r] : assert(false, "rounded_rect r(adius) should be list<num> or num"))
	let(rx = radii[0])
	let(ry = radii[1])
	assert(is_num(rx))
	assert(is_num(ry))
	assert(size[0] >= 2*rx, str("size[0] must be >= 2*r[0]; size[0] = ",size[0],", 2*r[0] = ",2*rx))
	assert(size[1] >= 2*ry, str("size[1] must be >= 2*r[1]; size[1] = ",size[1],", 2*r[1] = ",2*ry))
	let(quarterfn=max($fn/4, 1))
	let(qfnx = simplify_rounded_sides && size[0] == 2*rx ? quarterfn-1 : quarterfn)
	let(qfny = simplify_rounded_sides && size[1] == 2*ry ? quarterfn-1 : quarterfn)
	let(finalizepos = togmod1__make_nd_vector_adder(pos))
[
	for(a=[0 : 1 : qfnx]) let(ang=      a*90/quarterfn) finalizepos([ size[0]/2-rx + rx*cos(ang),  size[1]/2-ry + ry*sin(ang)]),
	for(a=[0 : 1 : qfny]) let(ang= 90 + a*90/quarterfn) finalizepos([-size[0]/2+rx + rx*cos(ang),  size[1]/2-ry + ry*sin(ang)]),
	for(a=[0 : 1 : qfnx]) let(ang=180 + a*90/quarterfn) finalizepos([-size[0]/2+rx + rx*cos(ang), -size[1]/2+ry + ry*sin(ang)]),
	for(a=[0 : 1 : qfny]) let(ang=270 + a*90/quarterfn) finalizepos([ size[0]/2-rx + rx*cos(ang), -size[1]/2+ry + ry*sin(ang)]),
];

function togmod1_make_rect(size) =
	togmod1_make_polygon([
		[-size[0]/2, -size[1]/2],
		[+size[0]/2, -size[1]/2],
		[+size[0]/2, +size[1]/2],
		[-size[0]/2, +size[1]/2],
	]);

function togmod1_make_rounded_rect(size, r) =
	r == 0 ? togmod1_make_rect(size) :
	togmod1_make_polygon(togmod1_rounded_rect_points(size,r,simplify_rounded_sides=true));

/**
 * Returns points for an approximation of a circle where points are at distance r from pos.
 * Can be used to make other regular polygons, but the faces will be less than that
 * distance from pos (do some trig if you want face distance, e.g. for a hex nut).
 */
function togmod1_circle_points(r, pos=[0,0], d=undef) =
	assert( !is_undef(r) || !is_undef(d) )
	assert(!is_undef(pos[0]))
	assert(!is_undef(pos[1]))
	let(finalizepos = togmod1__make_nd_vector_adder(pos))
	let(r_ = !is_undef(r) ? r : d/2)
	let(fn = max($fn, 3))
	[for(i=[0 : 1 : fn-1]) finalizepos([r_*cos(i*360/fn), r_*sin(i*360/fn)])];

function togmod1_make_circle(r, pos=[0,0], d=undef) =
	r == 0 || d == 0 ? ["union"] :
	togmod1_make_polygon(togmod1_circle_points(r=r, pos=pos, d=d));

function togmod1_make_cylinder(d, zrange=[0,1], r=undef, pos=[0,0]) =
	assert( !is_undef(r) || !is_undef(d) )
	let( r_ = !is_undef(r) ? r : d/2 )
	// TODO: Make polyhedron directly
	["linear-extrude-zs", zrange, togmod1_make_circle(r=r_, pos=pos)];

function togmod1__is_range1d(range) = is_list(range) && len(range) == 2 && is_num(range[0]) && is_num(range[1]);

function togmod1_linear_extrude_z(range, shape) =
	assert(togmod1__is_range1d(range))
	["linear-extrude-zs", range, shape];
function togmod1_linear_extrude_x(range, shape) =
	assert(togmod1__is_range1d(range))
	["rotate", [90, 0, 90], togmod1_linear_extrude_z(range, shape)];
function togmod1_linear_extrude_y(range, shape) =
	assert(togmod1__is_range1d(range))
	["rotate", [90, 0,  0], togmod1_linear_extrude_z([-range[1], -range[0]], shape)];

function togmod1_text(text, size, font, halign, valign, spacing, direction, language, script) =
	["text-tsfhvsdls", text, size, font, halign, valign, spacing, direction, language, script];
// file: ../lib/TOGMod1.scad
// TOGMod1.9
// OpenSCAD library for representing shapes
// 
// See also: Functional OpenSCAD (https://github.com/thehans/FunctionalOpenSCAD)
// 
// v1.8:
// - Add `text-tsfhvsdls`
// v1.9
// - Add `offset-ds` (offset with _d_elta a _s_hape)

module togmod1_domodule(mod) {
	assert(is_list(mod));
	assert(len(mod) > 0);
	if( mod[0] == "polygon-vp" ) {
		// ["polygon-vp", vertexes, paths]
		polygon(points=mod[1], paths=mod[2]);
	} else if( mod[0] == "polyhedron-vf" ) {
		polyhedron(mod[1], faces=mod[2]);
	} else if( mod[0] == "scale" ) {
		assert(len(mod) == 3);
		scale(mod[1]) togmod1_domodule(mod[2]);
	} else if( mod[0] == "translate" ) {
		assert(len(mod) == 3);
		assert(is_list(mod[1]));
		for(c=mod[1]) assert(is_num(c), "translate component should be numeric");
		translate(mod[1]) togmod1_domodule(mod[2]);
	} else if( mod[0] == "rotate" ) {
		assert(len(mod) == 3);
		rotate(mod[1]) togmod1_domodule(mod[2]);
	} else if( mod[0] == "intersection" ) {
		intersection_for( i=[1:1:len(mod)-1] ) togmod1_domodule(mod[i]);
	} else if( mod[0] == "difference" ) {
		difference() {
			togmod1_domodule(mod[1]);
			for( i=[2:1:len(mod)-1] ) togmod1_domodule(mod[i]);
		}
	} else if( mod[0] == "union" ) {
		for( i=[1:1:len(mod)-1] ) togmod1_domodule(mod[i]);
	} else if( mod[0] == "hull" ) {
		hull() for( i=[1:1:len(mod)-1] ) togmod1_domodule(mod[i]);
	} else if( mod[0] == "offset-rs" ) {
		assert(len(mod) == 3);
		assert(is_num(mod[1]));
		assert(is_list(mod[2]));
		offset(mod[1]) togmod1_domodule(mod[2]);
	} else if( mod[0] == "linear-extrude-zs" ) {
		// ["linear-extrude-zs", [z0,z1], 2d_shape] // centered
		// ["linear-extrude-zs", height, 2d_shape]
		let( zrange = is_list(mod[1]) ? mod[1] : [-mod[1]/2, mod[1]/2] ) {
			translate([0,0,zrange[0]]) linear_extrude(zrange[1]-zrange[0]) togmod1_domodule(mod[2]);
		}
	} else if( mod[0] == "render" ) {
		render() togmod1_domodule(mod[1]);
	} else if( mod[0] == "minkowski" ) {
		minkowski() {
			togmod1_domodule(mod[1]);
			togmod1_domodule(mod[2]);
		}
	} else if( mod[0] == "x-debug" ) {
		# togmod1_domodule(mod[1]);
	} else if( mod[0] == "x-color" ) {
		color(mod[1]) togmod1_domodule(mod[2]);
	} else if( mod[0] == "text-tsfhvsdls" ) {
		text(text=mod[1], size=mod[2], font=mod[3], halign=mod[4], valign=mod[5], spacing=mod[6], direction=mod[7], language=mod[7], script=mod[8]);
	} else if( mod[0] == "offset-ds" ) {
		assert(is_num(mod[1]));
		assert(is_list(mod[2]));
		offset(delta=mod[1]) togmod1_domodule(mod[2]);
	} else {
		assert(false, str("Unrecognized shape: ", mod[0]));
	}
}
// main file
// NutDriver0.1
// 
// Asa needs a long 9/16" socket to get a nut
// off a bolt, but we don't have one, so let's make one.

total_height = "2inch";
hex_depth = "3/8inch";
square_depth = "1.5inch";
hex_offset = 0.1;
square_offset = 0.2;
$fn = 144;

module __nutdriver0__end_params() { }

use <../lib/TOGMod1.scad>
use <../lib/TOGMod1Constructors.scad>
use <../lib/TOGUnits1.scad>

hex_depth_mm    = togunits1_decode(hex_depth);
square_depth_mm = togunits1_decode(square_depth);

togmod1_domodule(
	// sizes (mm)
	let( hex_ff = togunits1_to_mm("9/16inch") + hex_offset*2 )
	let( hex_depth_mm = togunits1_to_mm(hex_depth) )
	let( square_ff_mm = togunits1_to_mm("1.5inch") + square_offset*2 )
	let( square_depth_mm = togunits1_to_mm(square_depth) )
	let( total_h = togunits1_to_mm(total_height) )
	let( outer = togunits1_to_mm("2inch") )
	["difference",
		togmod1_linear_extrude_z([0,total_h], togmod1_make_rounded_rect([outer,outer], 5)),
		
		let( hex_c_to_c_r = hex_ff/2 / cos(360/6/2) )
		echo( hex_c_to_c_r = hex_c_to_c_r )
		togmod1_linear_extrude_z([-1,hex_depth_mm+1], togmod1_make_circle(r=hex_c_to_c_r, $fn=6)),
		
		togmod1_linear_extrude_z([hex_depth_mm,total_h+1], togmod1_make_rect([square_ff_mm,square_ff_mm])),
	]
);
